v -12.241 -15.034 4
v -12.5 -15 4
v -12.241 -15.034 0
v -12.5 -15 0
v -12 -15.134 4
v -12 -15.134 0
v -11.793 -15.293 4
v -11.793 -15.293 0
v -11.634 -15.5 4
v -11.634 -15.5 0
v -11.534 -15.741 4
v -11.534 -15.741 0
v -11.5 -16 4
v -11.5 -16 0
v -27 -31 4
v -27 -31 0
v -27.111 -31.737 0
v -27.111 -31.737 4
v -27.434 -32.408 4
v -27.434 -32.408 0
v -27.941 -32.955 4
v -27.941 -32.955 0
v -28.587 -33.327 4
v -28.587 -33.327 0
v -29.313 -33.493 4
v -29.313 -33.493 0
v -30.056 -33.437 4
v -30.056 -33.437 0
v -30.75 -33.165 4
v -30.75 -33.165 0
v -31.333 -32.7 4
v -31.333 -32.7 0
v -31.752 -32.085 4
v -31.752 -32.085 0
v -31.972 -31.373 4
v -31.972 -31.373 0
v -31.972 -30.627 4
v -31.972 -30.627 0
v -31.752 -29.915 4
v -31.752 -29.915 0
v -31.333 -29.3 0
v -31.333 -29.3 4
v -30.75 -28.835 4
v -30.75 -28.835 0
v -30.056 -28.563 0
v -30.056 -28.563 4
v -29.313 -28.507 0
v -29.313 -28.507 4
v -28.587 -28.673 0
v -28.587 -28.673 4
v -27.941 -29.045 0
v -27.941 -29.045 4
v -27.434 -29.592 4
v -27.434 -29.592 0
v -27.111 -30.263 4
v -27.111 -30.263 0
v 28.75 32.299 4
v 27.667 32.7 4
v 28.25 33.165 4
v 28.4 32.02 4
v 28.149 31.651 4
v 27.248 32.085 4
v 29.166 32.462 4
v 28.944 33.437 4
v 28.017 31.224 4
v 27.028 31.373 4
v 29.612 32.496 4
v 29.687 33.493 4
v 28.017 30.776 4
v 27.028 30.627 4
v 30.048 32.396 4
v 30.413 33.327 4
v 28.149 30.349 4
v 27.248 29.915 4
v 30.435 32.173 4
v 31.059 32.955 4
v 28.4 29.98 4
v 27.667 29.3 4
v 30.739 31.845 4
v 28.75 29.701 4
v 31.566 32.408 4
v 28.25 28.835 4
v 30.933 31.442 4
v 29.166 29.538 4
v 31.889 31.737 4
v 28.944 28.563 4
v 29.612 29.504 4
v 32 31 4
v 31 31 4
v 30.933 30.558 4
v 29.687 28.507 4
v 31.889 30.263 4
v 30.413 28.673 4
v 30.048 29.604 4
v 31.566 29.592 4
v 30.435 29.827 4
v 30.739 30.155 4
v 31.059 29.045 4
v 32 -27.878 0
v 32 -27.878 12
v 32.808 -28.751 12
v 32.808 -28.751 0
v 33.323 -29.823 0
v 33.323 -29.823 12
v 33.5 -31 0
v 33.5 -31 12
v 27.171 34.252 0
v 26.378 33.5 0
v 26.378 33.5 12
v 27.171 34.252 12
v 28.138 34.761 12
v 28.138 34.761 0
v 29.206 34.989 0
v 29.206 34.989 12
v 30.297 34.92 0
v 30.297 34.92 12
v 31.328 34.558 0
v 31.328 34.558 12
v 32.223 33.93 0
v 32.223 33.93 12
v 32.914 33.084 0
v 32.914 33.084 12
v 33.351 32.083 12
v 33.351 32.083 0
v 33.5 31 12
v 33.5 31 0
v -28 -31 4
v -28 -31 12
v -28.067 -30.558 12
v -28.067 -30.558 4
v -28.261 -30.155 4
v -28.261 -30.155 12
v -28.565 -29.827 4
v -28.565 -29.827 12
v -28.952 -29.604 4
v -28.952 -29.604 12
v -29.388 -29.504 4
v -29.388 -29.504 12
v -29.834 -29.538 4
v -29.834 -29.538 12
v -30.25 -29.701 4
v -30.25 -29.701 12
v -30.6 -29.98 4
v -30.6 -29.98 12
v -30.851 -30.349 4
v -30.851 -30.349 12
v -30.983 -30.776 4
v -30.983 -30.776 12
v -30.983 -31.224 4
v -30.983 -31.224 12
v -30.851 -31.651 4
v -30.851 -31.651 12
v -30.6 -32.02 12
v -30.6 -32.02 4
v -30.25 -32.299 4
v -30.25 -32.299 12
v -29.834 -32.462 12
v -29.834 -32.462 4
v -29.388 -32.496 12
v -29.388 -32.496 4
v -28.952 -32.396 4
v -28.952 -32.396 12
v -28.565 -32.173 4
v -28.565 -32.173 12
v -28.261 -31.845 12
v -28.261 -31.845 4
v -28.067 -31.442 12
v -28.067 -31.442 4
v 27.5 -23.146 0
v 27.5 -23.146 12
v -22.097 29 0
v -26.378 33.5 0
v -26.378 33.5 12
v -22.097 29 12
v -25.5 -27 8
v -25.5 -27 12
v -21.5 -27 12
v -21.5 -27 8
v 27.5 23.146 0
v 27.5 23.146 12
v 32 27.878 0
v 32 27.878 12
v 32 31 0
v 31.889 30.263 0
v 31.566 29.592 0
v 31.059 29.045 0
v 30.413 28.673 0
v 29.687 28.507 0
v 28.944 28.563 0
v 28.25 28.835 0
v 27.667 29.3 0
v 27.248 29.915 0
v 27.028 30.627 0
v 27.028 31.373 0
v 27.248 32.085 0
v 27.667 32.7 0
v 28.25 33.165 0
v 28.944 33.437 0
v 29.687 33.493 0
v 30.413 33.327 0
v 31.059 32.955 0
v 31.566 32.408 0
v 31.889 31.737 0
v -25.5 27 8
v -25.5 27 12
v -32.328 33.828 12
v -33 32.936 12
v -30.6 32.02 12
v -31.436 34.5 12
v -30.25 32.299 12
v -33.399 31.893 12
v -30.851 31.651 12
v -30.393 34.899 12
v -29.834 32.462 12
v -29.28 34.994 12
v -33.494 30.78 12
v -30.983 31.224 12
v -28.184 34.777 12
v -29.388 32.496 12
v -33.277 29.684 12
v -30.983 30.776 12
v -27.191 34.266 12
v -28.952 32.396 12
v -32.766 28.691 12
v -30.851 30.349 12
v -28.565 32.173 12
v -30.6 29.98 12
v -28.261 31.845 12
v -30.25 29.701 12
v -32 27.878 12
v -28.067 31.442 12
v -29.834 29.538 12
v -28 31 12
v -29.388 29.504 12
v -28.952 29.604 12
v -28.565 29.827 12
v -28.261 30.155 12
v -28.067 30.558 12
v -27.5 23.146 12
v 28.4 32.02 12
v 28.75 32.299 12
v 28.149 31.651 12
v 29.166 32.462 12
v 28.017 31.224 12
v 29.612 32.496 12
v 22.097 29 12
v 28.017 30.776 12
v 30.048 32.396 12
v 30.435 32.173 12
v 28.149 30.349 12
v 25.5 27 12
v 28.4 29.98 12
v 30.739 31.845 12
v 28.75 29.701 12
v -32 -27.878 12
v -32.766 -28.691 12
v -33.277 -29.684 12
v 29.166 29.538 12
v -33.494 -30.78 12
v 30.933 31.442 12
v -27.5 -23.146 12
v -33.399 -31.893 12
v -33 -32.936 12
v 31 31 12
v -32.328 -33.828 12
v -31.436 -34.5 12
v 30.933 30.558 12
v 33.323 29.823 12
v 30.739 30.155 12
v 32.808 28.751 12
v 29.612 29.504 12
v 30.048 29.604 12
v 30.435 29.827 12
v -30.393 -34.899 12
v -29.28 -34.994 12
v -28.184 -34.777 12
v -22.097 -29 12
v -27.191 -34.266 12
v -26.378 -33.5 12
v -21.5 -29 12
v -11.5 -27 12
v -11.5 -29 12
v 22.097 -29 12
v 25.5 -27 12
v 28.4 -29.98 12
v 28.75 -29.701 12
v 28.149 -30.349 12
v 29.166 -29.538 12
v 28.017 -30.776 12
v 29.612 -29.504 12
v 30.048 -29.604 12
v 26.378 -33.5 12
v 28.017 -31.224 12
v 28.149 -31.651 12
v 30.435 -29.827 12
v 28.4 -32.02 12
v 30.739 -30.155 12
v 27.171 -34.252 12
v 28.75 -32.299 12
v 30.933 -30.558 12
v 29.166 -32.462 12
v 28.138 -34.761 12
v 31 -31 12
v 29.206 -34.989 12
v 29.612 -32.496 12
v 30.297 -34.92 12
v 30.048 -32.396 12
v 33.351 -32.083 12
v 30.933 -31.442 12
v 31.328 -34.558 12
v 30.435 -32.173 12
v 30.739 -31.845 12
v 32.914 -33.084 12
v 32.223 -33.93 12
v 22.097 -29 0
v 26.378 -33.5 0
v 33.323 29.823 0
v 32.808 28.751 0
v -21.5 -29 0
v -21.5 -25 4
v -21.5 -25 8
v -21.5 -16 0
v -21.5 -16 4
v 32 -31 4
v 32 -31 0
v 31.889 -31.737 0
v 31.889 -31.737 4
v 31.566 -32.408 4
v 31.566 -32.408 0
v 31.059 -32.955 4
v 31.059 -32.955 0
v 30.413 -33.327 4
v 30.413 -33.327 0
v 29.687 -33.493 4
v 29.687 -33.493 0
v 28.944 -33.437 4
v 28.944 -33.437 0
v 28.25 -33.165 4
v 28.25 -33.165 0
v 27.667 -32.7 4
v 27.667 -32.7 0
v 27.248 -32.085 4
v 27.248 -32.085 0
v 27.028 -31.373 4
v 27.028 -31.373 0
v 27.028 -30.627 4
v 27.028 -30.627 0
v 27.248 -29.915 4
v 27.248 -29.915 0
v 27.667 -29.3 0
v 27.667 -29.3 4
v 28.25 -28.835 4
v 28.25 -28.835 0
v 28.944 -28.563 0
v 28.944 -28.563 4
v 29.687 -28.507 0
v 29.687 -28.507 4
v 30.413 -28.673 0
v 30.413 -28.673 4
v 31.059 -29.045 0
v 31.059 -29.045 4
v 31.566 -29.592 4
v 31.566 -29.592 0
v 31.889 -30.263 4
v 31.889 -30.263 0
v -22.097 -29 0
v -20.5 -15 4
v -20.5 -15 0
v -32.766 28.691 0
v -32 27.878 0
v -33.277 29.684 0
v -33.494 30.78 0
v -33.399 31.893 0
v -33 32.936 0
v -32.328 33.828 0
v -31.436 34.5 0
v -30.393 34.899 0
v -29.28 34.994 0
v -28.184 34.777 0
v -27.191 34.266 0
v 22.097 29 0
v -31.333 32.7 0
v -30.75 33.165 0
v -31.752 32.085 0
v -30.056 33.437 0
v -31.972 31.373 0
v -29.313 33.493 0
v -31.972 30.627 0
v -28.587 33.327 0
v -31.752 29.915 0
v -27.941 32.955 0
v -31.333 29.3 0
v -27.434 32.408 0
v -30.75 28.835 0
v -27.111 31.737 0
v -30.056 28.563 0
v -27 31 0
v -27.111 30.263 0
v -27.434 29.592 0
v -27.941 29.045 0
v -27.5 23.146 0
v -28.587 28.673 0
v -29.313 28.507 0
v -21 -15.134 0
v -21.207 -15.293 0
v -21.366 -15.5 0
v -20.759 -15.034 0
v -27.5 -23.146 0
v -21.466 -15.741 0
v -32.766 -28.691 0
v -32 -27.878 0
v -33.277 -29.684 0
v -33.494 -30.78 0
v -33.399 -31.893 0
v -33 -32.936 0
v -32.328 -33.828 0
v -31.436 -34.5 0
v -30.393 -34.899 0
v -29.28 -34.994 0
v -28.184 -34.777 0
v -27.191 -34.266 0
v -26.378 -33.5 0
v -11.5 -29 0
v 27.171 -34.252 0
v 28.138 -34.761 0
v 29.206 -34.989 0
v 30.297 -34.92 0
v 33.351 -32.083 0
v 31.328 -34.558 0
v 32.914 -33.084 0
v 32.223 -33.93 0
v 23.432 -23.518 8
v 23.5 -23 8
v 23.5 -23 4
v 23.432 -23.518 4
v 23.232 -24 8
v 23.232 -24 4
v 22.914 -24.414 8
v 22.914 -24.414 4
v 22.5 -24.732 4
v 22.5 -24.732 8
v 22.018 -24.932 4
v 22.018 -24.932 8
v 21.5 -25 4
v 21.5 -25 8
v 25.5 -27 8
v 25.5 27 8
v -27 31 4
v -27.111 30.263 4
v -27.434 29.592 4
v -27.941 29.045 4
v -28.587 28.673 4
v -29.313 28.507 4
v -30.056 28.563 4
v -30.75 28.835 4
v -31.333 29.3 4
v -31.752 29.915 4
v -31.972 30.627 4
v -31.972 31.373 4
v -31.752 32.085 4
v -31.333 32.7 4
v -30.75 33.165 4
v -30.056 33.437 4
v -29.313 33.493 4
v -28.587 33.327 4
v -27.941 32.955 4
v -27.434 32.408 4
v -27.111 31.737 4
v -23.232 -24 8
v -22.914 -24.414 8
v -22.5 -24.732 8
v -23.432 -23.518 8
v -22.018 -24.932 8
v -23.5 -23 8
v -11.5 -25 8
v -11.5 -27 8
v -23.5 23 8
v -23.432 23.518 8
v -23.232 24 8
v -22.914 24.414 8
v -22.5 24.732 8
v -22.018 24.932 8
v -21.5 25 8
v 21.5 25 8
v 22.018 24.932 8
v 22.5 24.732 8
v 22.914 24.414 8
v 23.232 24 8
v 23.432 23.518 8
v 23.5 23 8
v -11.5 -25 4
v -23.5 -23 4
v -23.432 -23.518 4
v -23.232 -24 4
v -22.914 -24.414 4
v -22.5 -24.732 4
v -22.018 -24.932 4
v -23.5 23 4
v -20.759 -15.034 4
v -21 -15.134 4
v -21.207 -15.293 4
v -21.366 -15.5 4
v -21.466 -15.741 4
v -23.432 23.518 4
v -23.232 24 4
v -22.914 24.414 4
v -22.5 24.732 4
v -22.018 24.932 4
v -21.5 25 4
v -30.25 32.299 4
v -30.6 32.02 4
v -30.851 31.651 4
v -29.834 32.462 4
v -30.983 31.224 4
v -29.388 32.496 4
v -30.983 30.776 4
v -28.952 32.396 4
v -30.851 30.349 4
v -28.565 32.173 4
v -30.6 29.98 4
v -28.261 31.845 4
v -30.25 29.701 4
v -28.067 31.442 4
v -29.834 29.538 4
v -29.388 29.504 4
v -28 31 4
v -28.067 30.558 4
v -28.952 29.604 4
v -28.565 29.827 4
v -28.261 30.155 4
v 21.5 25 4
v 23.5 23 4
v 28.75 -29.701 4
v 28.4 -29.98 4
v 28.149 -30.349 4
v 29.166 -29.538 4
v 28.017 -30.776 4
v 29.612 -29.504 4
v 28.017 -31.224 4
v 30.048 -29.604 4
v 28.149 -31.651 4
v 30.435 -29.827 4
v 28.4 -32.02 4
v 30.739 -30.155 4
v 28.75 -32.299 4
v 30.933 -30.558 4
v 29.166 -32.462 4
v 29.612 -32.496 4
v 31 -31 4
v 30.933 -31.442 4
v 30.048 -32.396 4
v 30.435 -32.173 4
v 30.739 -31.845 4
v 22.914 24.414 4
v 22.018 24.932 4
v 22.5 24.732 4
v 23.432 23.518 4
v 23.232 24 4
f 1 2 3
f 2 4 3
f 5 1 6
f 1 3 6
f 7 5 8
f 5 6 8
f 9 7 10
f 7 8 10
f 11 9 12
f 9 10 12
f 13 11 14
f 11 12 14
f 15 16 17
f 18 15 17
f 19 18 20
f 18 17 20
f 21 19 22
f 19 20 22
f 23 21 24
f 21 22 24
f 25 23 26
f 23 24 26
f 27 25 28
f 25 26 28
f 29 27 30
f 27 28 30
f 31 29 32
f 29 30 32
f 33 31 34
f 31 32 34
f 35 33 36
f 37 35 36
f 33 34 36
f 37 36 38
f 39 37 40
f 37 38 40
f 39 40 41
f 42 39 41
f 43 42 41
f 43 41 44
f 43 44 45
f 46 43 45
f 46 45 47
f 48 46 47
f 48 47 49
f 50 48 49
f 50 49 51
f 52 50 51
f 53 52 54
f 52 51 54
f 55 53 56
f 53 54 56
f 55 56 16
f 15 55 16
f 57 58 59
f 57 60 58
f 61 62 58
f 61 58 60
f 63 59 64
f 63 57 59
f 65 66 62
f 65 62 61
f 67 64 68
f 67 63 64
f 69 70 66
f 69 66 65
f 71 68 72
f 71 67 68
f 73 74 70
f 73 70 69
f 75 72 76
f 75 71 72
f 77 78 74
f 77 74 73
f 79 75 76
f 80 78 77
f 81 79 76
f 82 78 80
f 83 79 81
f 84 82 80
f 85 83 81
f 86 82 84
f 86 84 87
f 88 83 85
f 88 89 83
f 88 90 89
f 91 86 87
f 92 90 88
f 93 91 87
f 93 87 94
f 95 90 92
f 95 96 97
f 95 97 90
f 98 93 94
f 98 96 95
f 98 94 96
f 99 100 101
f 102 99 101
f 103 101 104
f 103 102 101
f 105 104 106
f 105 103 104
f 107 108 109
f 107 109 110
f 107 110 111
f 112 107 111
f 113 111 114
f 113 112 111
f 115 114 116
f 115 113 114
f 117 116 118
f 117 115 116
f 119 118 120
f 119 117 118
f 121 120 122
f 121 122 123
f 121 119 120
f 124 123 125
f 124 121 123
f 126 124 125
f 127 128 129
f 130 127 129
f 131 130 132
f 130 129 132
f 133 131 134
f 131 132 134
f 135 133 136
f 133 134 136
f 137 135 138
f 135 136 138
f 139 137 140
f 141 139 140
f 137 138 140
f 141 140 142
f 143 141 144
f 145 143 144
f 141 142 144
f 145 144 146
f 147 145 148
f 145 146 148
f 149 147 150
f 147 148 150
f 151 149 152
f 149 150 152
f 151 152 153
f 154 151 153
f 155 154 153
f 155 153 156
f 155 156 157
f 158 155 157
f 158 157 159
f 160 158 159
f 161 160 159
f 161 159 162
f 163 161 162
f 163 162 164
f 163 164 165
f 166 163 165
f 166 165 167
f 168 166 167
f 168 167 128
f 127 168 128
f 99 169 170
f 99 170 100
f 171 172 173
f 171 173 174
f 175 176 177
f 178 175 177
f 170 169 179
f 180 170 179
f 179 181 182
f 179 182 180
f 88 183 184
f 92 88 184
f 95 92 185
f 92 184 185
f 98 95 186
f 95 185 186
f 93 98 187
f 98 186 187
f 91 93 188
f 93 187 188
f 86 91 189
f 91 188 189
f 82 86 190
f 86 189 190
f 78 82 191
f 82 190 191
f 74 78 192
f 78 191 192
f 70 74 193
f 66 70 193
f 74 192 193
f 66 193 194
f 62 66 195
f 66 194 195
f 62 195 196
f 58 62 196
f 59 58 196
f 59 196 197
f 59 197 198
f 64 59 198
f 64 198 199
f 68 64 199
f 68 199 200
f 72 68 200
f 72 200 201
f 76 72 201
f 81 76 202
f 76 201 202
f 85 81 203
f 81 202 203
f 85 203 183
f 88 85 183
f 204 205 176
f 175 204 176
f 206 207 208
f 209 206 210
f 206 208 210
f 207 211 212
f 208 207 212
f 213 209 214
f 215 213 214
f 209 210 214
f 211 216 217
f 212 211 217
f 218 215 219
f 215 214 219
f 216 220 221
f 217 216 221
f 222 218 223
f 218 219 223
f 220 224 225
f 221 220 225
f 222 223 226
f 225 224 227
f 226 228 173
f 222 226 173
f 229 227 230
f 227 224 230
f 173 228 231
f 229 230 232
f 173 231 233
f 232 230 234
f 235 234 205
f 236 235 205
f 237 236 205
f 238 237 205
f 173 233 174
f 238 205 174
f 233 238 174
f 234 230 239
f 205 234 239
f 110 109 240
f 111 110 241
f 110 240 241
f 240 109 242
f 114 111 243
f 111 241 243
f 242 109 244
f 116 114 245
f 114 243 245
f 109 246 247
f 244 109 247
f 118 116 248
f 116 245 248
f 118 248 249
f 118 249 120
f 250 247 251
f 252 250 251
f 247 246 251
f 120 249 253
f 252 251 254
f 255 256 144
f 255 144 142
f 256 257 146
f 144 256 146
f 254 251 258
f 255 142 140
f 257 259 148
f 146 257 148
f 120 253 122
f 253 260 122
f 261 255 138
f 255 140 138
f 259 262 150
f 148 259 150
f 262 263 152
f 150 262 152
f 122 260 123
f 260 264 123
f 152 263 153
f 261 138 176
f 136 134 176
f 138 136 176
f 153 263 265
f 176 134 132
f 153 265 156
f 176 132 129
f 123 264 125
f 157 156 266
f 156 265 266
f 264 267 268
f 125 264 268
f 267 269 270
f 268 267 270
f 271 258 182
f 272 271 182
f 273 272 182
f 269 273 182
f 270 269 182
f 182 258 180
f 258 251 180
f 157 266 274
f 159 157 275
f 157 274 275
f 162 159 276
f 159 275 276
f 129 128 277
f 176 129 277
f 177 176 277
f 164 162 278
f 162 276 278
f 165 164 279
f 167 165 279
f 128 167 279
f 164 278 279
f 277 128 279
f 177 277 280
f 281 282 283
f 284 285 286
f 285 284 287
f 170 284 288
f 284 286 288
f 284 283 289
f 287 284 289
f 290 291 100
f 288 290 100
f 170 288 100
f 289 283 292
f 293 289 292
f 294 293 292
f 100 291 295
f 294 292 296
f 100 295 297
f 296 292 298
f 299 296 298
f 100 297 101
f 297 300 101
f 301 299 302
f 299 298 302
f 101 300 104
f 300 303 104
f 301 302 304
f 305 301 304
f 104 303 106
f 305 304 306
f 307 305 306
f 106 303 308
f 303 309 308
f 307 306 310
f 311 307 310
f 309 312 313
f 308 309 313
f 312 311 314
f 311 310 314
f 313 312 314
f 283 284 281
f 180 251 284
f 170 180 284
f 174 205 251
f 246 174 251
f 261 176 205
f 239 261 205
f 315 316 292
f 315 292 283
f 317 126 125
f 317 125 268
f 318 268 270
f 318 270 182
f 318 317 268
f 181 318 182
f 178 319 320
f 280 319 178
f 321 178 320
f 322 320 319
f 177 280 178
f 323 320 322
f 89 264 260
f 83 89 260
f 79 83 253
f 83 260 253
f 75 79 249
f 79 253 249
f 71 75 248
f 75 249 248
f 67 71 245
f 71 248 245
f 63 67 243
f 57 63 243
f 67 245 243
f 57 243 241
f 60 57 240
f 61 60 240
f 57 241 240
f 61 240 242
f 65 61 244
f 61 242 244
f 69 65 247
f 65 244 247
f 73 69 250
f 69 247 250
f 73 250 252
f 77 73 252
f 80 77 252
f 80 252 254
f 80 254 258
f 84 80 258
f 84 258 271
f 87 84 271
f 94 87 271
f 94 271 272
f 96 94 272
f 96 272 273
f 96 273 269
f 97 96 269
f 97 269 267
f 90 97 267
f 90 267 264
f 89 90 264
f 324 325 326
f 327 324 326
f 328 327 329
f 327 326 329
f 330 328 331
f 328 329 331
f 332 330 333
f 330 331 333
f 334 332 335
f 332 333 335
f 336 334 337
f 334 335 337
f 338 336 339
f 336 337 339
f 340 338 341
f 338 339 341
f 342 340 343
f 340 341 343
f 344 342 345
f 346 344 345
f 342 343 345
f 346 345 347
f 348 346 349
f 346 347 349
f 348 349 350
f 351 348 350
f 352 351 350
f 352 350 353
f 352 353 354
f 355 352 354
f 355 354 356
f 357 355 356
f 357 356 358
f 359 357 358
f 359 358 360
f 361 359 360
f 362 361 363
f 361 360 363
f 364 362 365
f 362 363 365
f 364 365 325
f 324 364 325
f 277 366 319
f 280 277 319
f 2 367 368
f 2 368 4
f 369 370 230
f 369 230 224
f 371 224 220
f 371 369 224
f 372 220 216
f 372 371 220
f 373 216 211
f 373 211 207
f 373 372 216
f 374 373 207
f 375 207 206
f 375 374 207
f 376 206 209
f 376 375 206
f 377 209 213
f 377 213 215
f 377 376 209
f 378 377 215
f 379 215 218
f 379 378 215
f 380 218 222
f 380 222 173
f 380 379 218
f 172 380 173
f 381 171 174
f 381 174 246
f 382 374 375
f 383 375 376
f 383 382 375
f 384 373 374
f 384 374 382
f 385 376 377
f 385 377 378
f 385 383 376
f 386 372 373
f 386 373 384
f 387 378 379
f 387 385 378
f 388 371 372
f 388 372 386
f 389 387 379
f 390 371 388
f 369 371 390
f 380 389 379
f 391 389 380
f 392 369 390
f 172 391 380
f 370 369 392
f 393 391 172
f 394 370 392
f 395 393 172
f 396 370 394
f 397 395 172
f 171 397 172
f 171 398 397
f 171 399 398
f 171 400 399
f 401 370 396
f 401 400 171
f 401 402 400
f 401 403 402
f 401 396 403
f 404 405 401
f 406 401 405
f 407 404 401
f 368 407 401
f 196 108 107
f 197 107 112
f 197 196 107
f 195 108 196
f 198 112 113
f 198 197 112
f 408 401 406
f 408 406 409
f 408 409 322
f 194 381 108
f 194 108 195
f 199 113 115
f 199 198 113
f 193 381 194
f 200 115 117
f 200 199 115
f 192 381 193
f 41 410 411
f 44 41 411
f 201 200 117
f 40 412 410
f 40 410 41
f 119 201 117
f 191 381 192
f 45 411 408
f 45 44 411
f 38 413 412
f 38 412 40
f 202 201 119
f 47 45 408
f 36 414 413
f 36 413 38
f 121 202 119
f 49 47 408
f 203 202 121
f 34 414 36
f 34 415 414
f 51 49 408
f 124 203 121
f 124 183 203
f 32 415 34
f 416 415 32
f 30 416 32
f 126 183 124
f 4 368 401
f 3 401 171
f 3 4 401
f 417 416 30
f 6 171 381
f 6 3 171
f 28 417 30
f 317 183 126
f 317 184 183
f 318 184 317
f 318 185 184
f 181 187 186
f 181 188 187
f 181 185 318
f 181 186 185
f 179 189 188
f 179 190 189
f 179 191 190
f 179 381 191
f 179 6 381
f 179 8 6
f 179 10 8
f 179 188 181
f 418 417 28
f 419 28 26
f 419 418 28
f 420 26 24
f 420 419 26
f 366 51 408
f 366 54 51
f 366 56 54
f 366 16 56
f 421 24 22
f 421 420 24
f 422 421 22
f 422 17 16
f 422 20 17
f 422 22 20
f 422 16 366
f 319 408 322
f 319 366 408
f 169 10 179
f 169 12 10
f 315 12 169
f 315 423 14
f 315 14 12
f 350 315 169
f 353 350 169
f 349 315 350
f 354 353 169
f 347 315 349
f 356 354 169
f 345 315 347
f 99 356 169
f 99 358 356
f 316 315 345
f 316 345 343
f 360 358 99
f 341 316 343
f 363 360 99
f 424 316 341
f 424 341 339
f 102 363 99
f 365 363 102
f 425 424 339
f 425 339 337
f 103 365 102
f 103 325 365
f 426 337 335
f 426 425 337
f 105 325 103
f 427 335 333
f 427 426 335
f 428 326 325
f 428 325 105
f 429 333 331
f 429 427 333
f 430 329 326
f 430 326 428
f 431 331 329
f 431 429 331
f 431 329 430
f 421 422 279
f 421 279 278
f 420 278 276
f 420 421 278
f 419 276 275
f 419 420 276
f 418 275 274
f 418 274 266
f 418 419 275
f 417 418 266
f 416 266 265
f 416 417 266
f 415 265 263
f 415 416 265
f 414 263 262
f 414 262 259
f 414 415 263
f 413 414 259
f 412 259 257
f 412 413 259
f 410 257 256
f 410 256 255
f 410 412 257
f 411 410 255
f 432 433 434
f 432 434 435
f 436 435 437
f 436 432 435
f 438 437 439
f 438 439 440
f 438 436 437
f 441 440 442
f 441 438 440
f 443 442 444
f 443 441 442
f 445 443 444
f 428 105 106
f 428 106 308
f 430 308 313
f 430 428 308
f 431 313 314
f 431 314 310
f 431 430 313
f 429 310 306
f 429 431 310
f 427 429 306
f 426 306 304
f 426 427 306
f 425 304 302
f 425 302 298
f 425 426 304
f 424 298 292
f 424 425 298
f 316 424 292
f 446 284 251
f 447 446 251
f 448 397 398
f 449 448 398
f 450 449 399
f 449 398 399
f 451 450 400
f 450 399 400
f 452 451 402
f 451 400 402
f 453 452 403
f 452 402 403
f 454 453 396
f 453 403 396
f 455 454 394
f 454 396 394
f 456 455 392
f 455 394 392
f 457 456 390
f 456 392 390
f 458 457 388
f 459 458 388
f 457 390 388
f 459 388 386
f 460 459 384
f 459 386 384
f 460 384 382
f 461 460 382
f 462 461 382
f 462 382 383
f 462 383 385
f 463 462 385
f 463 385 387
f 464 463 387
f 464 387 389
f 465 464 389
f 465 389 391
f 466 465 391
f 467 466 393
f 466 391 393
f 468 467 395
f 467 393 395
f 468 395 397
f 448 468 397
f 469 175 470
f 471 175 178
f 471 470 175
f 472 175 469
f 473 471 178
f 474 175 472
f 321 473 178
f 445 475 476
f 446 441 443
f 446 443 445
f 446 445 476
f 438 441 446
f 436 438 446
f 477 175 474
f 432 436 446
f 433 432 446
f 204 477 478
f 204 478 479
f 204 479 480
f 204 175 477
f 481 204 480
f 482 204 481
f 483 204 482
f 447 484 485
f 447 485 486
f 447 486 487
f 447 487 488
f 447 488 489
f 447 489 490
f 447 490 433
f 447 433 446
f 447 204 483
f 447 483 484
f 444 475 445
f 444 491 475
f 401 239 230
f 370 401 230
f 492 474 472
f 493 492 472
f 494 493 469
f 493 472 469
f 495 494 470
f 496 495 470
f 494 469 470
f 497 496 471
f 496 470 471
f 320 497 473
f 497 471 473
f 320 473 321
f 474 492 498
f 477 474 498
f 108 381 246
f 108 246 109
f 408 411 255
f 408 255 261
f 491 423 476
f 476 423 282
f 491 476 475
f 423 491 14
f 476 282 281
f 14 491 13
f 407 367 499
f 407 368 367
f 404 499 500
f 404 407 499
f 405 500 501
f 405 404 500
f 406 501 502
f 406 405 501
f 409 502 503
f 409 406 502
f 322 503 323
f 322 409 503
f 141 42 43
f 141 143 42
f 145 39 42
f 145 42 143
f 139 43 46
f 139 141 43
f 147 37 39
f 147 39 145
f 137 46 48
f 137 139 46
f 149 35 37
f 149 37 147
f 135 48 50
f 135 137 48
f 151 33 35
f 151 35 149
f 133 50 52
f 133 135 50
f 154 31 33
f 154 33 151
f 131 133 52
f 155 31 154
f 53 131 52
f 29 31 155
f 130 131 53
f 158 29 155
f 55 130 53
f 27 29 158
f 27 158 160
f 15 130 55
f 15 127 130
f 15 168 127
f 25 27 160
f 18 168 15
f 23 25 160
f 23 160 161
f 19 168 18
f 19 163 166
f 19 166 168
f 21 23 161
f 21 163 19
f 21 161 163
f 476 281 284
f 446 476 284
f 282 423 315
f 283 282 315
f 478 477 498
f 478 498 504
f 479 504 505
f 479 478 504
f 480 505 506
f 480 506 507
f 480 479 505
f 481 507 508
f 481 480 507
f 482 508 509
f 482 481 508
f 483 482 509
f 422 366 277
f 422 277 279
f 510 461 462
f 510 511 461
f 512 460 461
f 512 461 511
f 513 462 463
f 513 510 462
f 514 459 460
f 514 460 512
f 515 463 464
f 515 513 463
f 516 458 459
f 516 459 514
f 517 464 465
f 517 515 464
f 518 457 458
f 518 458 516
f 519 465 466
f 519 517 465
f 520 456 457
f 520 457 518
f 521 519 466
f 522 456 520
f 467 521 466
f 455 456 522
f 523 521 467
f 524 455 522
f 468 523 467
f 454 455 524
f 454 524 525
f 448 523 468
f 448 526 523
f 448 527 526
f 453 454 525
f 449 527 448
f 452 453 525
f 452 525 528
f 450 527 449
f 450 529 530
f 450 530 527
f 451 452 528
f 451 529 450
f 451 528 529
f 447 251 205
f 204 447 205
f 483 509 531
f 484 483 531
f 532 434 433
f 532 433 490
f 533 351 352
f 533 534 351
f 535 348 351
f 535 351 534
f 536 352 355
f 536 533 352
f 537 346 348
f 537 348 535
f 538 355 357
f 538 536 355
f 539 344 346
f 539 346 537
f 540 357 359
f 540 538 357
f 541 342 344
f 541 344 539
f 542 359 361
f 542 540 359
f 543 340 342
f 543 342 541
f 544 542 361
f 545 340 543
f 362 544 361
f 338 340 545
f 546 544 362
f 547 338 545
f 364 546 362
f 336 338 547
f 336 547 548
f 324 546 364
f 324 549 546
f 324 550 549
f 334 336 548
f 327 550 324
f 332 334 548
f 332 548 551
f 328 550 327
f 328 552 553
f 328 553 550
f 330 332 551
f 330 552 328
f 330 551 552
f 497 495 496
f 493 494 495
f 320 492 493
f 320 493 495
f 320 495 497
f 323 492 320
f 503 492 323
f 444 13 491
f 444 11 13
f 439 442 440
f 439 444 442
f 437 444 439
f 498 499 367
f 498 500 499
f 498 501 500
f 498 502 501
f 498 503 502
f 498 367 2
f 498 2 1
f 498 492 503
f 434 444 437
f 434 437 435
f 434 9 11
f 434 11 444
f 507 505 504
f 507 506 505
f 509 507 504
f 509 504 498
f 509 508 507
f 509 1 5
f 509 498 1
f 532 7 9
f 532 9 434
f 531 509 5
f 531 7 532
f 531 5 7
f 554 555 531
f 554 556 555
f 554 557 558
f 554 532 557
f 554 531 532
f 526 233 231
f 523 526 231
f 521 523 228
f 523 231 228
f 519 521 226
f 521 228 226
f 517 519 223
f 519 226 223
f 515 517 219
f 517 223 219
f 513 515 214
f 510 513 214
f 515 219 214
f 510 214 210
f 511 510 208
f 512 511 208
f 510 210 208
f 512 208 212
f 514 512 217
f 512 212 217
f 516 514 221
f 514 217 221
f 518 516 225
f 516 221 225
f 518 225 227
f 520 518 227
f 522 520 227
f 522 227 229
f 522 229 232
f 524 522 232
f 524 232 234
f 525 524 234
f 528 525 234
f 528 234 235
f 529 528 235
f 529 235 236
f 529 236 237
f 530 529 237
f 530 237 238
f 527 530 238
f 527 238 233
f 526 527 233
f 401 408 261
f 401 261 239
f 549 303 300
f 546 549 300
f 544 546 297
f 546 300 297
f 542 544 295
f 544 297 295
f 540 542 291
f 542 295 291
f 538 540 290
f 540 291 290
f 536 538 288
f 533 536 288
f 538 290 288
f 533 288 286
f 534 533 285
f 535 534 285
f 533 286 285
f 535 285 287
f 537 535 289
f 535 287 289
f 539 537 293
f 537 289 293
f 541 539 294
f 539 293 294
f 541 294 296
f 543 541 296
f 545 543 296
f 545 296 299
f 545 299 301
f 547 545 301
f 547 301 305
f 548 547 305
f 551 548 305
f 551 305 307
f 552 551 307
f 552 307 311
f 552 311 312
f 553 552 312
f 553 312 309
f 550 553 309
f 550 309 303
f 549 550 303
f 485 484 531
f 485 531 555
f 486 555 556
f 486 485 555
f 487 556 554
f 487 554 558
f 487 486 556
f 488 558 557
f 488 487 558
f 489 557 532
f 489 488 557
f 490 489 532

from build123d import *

# Parameters (mm, degrees)
F0_W      = 55
F0_H      = 58
F1_DEPTH  = 4
F2_W      = 55
F2_H      = 58
F2_W_2    = 47
F2_H_2    = 50
F3_DEPTH  = 8
F4_R      = 2
F5_W      = 10
F5_H      = 10
F6_DEPTH  = 25.4
F7_W      = 10
F7_H      = 4
F8_DEPTH  = 17.018
F9_R      = 1
F11_DEPTH = 4
F13_DEPTH = 12
F14_R     = 2.5
F15_DEPTH = 4
F16_R     = 1.5
F17_DEPTH = 25.4


# Not quite as in the source:
# - a feature names something its author has since deleted; it is built from what else it names


with BuildPart() as f1:
    # F0 (on Top) → F1 (new body)
    with BuildSketch(Plane.XY):
        Rectangle(F0_W, F0_H)
    extrude(amount=F1_DEPTH)

    # F2 (on face) → F3 (join)
    with BuildSketch(Plane.XY.offset(4)):
        Rectangle(F2_W, F2_H)
        Rectangle(F2_W_2, F2_H_2, mode=Mode.SUBTRACT)
    extrude(amount=F3_DEPTH)

    # F4
    f4_edges = [f1.edges().sort_by_distance(p)[0] for p in [
        (23.5, -25, 8),
        (-23.5, -25, 8),
        (-23.5, 25, 8),
        (23.5, 25, 8),
    ]]
    fillet(f4_edges, radius=F4_R)

    # F5 (on face) → F6 (cut)
    with BuildSketch(Plane.XY.offset(12)):
        with Locations((-16.5, -20)):
            Rectangle(F5_W, F5_H)
    extrude(amount=-F6_DEPTH, mode=Mode.SUBTRACT)

    # F7 (on face) → F8 (cut)
    with BuildSketch(Plane.XY.offset(12)):
        with Locations((-16.5, -27)):
            Rectangle(F7_W, F7_H)
    extrude(amount=-F8_DEPTH, mode=Mode.SUBTRACT)

    # F9
    f9_edges = [f1.edges().sort_by_distance(p)[0] for p in [
        (-21.5, -15, 2),
        (-11.5, -15, 2),
    ]]
    fillet(f9_edges, radius=F9_R)

    # F10 (on face) → F11 (cut)
    with BuildSketch(Plane.XY.offset(12)):
        with BuildLine():
            Line((25.5, -27), (25.5, 27))
            Line((25.5, 27), (-25.5, 27))
            Line((-25.5, 27), (-25.5, -27))
            Line((-25.5, -27), (-21.5, -27))
            Line((-21.5, -27), (-21.5, -25))
            ThreePointArc((-21.5, -25), (-22.9142135624, -24.4142135624), (-23.5, -23))
            Line((-23.5, -23), (-23.5, 23))
            ThreePointArc((-23.5, 23), (-22.9142135624, 24.4142135624), (-21.5, 25))
            Line((-21.5, 25), (21.5, 25))
            ThreePointArc((21.5, 25), (22.9142135624, 24.4142135624), (23.5, 23))
            Line((23.5, 23), (23.5, -23))
            ThreePointArc((23.5, -23), (22.9142135624, -24.4142135624), (21.5, -25))
            Line((21.5, -25), (-11.5, -25))
            Line((-11.5, -25), (-11.5, -27))
            Line((-11.5, -27), (25.5, -27))
        make_face()
    extrude(amount=-F11_DEPTH, mode=Mode.SUBTRACT)

    # F12 (on face) → F13 (join)
    with BuildSketch(Plane(origin=(0, 0, 0), x_dir=(1, 0, 0), z_dir=(0, 0, -1))):
        with BuildLine():
            ThreePointArc((-26.0358983849, 29), (-25.6362966948, 29.9647238196), (-25.5, 31))
            ThreePointArc((-25.5, 31), (-25.7257453718, 32.3247648854), (-26.3775010008, 33.5))
            Line((-26.3775010008, 33.5), (-32, 33.5))
            Line((-32, 33.5), (-32, 27.8775010008))
            ThreePointArc((-32, 27.8775010008), (-29.8027756377, 27.011475597), (-27.5, 27.5358983849))
            Line((-27.5, 27.5358983849), (-27.5, 29))
            Line((-27.5, 29), (-26.0358983849, 29))
        make_face()
        with BuildLine():
            Line((-32, 33.5), (-26.3775010008, 33.5))
            ThreePointArc((-26.3775010008, 33.5), (-32.3284271247, 33.8284271247), (-32, 27.8775010008))
            Line((-32, 27.8775010008), (-32, 33.5))
        make_face()
        with BuildLine():
            ThreePointArc((-27.5, 27.5358983849), (-29.8027756377, 27.011475597), (-32, 27.8775010008))
            Line((-32, 27.8775010008), (-27.5, 23.1462475253))
            Line((-27.5, 23.1462475253), (-27.5, 27.5358983849))
        make_face()
        with BuildLine():
            ThreePointArc((-26.3775010008, 33.5), (-25.7257453718, 32.3247648854), (-25.5, 31))
            ThreePointArc((-25.5, 31), (-25.6362966948, 29.9647238196), (-26.0358983849, 29))
            Line((-26.0358983849, 29), (-22.0974513047, 29))
            Line((-22.0974513047, 29), (-26.3775010008, 33.5))
        make_face()
        with BuildLine():
            Line((32, 33.5), (26.3775010008, 33.5))
            ThreePointArc((26.3775010008, 33.5), (25.511475597, 31.3027756377), (26.0358983849, 29))
            Line((26.0358983849, 29), (27.5, 29))
            Line((27.5, 29), (27.5, 27.5358983849))
            ThreePointArc((27.5, 27.5358983849), (29.8027756377, 27.011475597), (32, 27.8775010008))
            Line((32, 27.8775010008), (32, 33.5))
        make_face()
        with BuildLine():
            ThreePointArc((33.5, 31), (30.8247648854, 34.7742546282), (26.3775010008, 33.5))
            Line((26.3775010008, 33.5), (32, 33.5))
            Line((32, 33.5), (32, 27.8775010008))
            ThreePointArc((32, 27.8775010008), (33.1055512755, 29.2679491924), (33.5, 31))
        make_face()
        with BuildLine():
            Line((27.5, 23.1462475253), (32, 27.8775010008))
            ThreePointArc((32, 27.8775010008), (29.8027756377, 27.011475597), (27.5, 27.5358983849))
            Line((27.5, 27.5358983849), (27.5, 23.1462475253))
        make_face()
        with BuildLine():
            ThreePointArc((26.0358983849, 29), (25.511475597, 31.3027756377), (26.3775010008, 33.5))
            Line((26.3775010008, 33.5), (22.0974513047, 29))
            Line((22.0974513047, 29), (26.0358983849, 29))
        make_face()
        with BuildLine():
            ThreePointArc((-27.5, -27.5358983849), (-29.8027756377, -27.011475597), (-32, -27.8775010008))
            Line((-32, -27.8775010008), (-32, -33.5))
            Line((-32, -33.5), (-26.3775010008, -33.5))
            ThreePointArc((-26.3775010008, -33.5), (-25.7257453718, -32.3247648854), (-25.5, -31))
            ThreePointArc((-25.5, -31), (-25.6362966948, -29.9647238196), (-26.0358983849, -29))
            Line((-26.0358983849, -29), (-27.5, -29))
            Line((-27.5, -29), (-27.5, -27.5358983849))
        make_face()
        with BuildLine():
            Line((-32, -33.5), (-32, -27.8775010008))
            ThreePointArc((-32, -27.8775010008), (-32.3284271247, -33.8284271247), (-26.3775010008, -33.5))
            Line((-26.3775010008, -33.5), (-32, -33.5))
        make_face()
        with BuildLine():
            Line((-27.5, -23.1462475253), (-32, -27.8775010008))
            ThreePointArc((-32, -27.8775010008), (-29.8027756377, -27.011475597), (-27.5, -27.5358983849))
            Line((-27.5, -27.5358983849), (-27.5, -23.1462475253))
        make_face()
        with BuildLine():
            ThreePointArc((-25.5, -31), (-25.7257453718, -32.3247648854), (-26.3775010008, -33.5))
            Line((-26.3775010008, -33.5), (-22.0974513047, -29))
            Line((-22.0974513047, -29), (-26.0358983849, -29))
            ThreePointArc((-26.0358983849, -29), (-25.6362966948, -29.9647238196), (-25.5, -31))
        make_face()
        with BuildLine():
            ThreePointArc((26.0358983849, -29), (25.511475597, -31.3027756377), (26.3775010008, -33.5))
            Line((26.3775010008, -33.5), (32, -33.5))
            Line((32, -33.5), (32, -27.8775010008))
            ThreePointArc((32, -27.8775010008), (29.8027756377, -27.011475597), (27.5, -27.5358983849))
            Line((27.5, -27.5358983849), (27.5, -29))
            Line((27.5, -29), (26.0358983849, -29))
        make_face()
        with BuildLine():
            Line((22.0974513047, -29), (26.3775010008, -33.5))
            ThreePointArc((26.3775010008, -33.5), (25.511475597, -31.3027756377), (26.0358983849, -29))
            Line((26.0358983849, -29), (22.0974513047, -29))
        make_face()
        with BuildLine():
            ThreePointArc((27.5, -27.5358983849), (29.8027756377, -27.011475597), (32, -27.8775010008))
            Line((32, -27.8775010008), (27.5, -23.1462475253))
            Line((27.5, -23.1462475253), (27.5, -27.5358983849))
        make_face()
        with BuildLine():
            Line((32, -33.5), (26.3775010008, -33.5))
            ThreePointArc((26.3775010008, -33.5), (30.8247648854, -34.7742546282), (33.5, -31))
            ThreePointArc((33.5, -31), (33.1055512755, -29.2679491924), (32, -27.8775010008))
            Line((32, -27.8775010008), (32, -33.5))
        make_face()
    extrude(amount=-F13_DEPTH)

    # F14 (on face) → F15 (cut)
    with BuildSketch(Plane(origin=(0, 0, 0), x_dir=(1, 0, 0), z_dir=(0, 0, -1))):
        with Locations((-29.5, -31)):
            Circle(F14_R)
        with Locations((29.5, -31)):
            Circle(F14_R)
        with Locations((-29.5, 31)):
            Circle(F14_R)
        with Locations((29.5, 31)):
            Circle(F14_R)
    extrude(amount=-F15_DEPTH, mode=Mode.SUBTRACT)

    # F16 (on face) → F17 (cut)
    with BuildSketch(Plane.XY.offset(12)):
        with Locations((29.5, -31)):
            Circle(F16_R)
        with Locations((-29.5, -31)):
            Circle(F16_R)
        with Locations((29.5, 31)):
            Circle(F16_R)
        with Locations((-29.5, 31)):
            Circle(F16_R)
    extrude(amount=-F17_DEPTH, mode=Mode.SUBTRACT)


solid = f1.part
